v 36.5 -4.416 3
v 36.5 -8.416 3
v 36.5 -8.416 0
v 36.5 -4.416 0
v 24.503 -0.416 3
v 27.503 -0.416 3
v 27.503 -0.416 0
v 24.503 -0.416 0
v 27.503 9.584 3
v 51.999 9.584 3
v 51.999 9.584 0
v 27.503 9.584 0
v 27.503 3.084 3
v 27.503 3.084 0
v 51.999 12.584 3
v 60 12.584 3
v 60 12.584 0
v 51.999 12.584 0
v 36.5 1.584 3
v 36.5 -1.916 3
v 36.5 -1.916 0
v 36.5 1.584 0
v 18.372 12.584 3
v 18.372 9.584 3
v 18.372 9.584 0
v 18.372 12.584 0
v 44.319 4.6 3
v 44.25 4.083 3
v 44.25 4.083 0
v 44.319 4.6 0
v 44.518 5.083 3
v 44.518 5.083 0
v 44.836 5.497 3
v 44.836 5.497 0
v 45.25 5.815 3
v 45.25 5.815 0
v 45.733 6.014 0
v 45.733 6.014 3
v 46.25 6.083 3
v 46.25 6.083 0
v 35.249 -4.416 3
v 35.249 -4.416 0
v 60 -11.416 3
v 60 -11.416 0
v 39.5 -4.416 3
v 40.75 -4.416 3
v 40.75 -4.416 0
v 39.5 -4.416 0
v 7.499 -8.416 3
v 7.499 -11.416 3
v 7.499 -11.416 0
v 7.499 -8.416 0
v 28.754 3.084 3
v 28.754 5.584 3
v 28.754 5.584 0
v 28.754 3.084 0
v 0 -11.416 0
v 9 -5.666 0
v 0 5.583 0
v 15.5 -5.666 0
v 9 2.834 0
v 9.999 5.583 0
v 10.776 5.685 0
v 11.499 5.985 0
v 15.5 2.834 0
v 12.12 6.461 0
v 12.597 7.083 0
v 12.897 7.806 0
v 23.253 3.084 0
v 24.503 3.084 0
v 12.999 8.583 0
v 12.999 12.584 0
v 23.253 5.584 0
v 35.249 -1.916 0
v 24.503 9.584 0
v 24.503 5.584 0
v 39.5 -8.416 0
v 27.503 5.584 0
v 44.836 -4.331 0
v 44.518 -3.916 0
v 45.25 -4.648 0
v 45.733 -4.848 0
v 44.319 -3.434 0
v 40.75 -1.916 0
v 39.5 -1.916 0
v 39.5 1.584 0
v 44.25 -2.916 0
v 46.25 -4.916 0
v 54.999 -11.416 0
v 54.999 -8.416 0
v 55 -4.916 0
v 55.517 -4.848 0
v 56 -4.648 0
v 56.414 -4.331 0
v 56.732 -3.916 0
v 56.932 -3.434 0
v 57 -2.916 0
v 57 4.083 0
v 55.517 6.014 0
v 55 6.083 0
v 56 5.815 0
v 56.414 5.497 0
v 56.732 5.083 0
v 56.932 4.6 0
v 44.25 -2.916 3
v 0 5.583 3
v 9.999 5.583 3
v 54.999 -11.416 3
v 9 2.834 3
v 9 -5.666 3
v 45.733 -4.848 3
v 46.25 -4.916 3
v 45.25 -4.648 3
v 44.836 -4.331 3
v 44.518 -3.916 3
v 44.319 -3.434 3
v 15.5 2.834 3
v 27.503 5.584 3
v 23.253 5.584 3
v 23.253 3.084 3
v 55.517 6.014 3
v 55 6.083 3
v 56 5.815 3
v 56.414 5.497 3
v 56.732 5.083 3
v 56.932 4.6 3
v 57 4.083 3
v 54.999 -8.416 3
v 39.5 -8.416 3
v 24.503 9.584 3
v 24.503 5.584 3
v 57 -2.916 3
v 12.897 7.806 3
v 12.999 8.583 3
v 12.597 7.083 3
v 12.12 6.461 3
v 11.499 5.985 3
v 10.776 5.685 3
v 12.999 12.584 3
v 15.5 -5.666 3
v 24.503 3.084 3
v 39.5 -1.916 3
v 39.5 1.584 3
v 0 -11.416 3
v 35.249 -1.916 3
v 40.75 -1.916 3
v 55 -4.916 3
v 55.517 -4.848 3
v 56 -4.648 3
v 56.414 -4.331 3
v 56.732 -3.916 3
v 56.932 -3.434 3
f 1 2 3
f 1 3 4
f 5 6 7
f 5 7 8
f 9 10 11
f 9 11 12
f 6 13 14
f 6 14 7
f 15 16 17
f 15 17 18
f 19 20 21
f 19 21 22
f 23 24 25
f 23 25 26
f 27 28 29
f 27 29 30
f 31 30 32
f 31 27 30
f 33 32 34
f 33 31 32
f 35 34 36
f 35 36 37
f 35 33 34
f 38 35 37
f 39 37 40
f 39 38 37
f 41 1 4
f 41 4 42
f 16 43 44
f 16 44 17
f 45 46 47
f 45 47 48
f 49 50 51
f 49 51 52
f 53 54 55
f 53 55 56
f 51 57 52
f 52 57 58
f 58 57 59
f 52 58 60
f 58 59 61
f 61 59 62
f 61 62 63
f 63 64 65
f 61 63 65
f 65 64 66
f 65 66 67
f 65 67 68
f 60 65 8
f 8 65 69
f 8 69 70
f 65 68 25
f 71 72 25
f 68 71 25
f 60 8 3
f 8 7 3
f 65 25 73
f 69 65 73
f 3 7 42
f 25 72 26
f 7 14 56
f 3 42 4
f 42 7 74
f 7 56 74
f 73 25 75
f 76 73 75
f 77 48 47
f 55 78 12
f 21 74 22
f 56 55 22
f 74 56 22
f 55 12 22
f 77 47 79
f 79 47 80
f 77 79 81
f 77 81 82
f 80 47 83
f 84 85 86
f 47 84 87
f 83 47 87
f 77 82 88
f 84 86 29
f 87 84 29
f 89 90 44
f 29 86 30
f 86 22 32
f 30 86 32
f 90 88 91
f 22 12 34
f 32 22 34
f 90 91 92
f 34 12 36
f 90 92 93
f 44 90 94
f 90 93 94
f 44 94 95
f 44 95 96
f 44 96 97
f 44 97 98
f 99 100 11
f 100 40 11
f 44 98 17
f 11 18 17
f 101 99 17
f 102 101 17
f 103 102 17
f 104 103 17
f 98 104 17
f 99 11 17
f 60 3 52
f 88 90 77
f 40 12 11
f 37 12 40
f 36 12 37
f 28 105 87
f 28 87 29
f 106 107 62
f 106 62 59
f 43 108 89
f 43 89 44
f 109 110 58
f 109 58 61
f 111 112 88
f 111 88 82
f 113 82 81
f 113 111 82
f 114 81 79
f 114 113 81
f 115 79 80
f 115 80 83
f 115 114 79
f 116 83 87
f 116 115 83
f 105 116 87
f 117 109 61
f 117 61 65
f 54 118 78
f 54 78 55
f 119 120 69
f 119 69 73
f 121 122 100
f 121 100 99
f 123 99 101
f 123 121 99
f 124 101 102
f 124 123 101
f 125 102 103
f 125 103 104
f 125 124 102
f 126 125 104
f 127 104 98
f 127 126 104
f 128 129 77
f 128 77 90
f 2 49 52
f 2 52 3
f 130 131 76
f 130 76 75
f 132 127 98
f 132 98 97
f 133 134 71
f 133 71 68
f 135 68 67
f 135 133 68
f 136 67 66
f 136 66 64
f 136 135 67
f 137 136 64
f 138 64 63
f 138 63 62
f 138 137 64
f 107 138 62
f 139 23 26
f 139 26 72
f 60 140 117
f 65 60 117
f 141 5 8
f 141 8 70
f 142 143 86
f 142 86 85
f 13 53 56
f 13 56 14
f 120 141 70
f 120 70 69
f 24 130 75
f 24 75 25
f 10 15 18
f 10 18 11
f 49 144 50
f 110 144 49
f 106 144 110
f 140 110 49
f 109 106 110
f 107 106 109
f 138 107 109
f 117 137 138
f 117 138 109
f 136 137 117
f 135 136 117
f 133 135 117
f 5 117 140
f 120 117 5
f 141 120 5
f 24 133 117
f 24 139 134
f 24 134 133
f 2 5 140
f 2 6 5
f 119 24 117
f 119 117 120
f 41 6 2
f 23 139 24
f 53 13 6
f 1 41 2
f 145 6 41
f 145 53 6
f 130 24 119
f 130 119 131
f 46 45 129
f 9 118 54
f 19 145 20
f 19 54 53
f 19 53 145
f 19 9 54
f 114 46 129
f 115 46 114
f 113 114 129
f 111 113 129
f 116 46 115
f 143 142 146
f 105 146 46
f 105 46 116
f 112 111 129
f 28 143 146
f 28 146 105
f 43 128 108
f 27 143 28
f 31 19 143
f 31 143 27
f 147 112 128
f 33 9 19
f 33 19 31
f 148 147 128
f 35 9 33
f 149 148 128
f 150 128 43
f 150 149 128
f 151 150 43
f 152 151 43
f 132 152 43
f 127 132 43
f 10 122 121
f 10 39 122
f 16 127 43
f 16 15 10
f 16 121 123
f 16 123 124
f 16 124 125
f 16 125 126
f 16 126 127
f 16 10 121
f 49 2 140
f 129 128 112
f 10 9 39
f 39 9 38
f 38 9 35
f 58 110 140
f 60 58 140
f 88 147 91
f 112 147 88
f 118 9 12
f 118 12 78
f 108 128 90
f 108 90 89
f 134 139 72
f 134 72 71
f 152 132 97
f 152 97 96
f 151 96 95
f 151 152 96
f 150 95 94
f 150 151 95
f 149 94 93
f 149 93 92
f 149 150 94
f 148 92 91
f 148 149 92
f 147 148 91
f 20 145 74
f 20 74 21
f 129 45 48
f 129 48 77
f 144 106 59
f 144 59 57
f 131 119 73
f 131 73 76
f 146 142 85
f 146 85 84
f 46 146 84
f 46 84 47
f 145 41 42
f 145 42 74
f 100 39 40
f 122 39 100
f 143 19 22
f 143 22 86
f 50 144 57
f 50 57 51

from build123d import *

# Parameters (mm, degrees)
SKETCH_1_W      = 6.5
SKETCH_1_H      = 8.5
EXTRUDE_1_DEPTH = 3


with BuildPart() as part:
    # 草图1 → 凸台-拉伸1 (new body)
    with BuildSketch(Plane.XY.offset(3)):
        with BuildLine():
            Line((7.4994, -8.416368207), (36.5002, -8.416368207))
            Line((36.5002, -8.416368207), (36.5002, -4.416368207))
            Line((36.5002, -4.416368207), (35.2489, -4.416368207))
            Line((35.2489, -4.416368207), (35.2489, -1.916368207))
            Line((35.2489, -1.916368207), (36.5002, -1.916368207))
            Line((36.5002, -1.916368207), (36.5002, 1.583631793))
            Line((36.5002, 1.583631793), (39.5003, 1.583631793))
            Line((39.5003, 1.583631793), (39.5003, -1.916368207))
            Line((39.5003, -1.916368207), (40.7501, -1.916368207))
            Line((40.7501, -1.916368207), (40.7501, -4.416368207))
            Line((40.7501, -4.416368207), (39.5003, -4.416368207))
            Line((39.5003, -4.416368207), (39.5003, -8.416368207))
            Line((39.5003, -8.416368207), (54.9988, -8.416368207))
            Line((54.9988, -8.416368207), (54.9988, -11.416368207))
            Line((54.9988, -11.416368207), (59.9998, -11.416368207))
            Line((59.9998, -11.416368207), (59.9998, 12.583631793))
            Line((59.9998, 12.583631793), (51.9988, 12.583631793))
            Line((51.9988, 12.583631793), (51.9988, 9.583631793))
            Line((51.9988, 9.583631793), (27.5031, 9.583631793))
            Line((27.5031, 9.583631793), (27.5031, 5.583631793))
            Line((27.5031, 5.583631793), (28.7543, 5.583631793))
            Line((28.7543, 5.583631793), (28.7543, 3.083631793))
            Line((28.7543, 3.083631793), (27.5031, 3.083631793))
            Line((27.5031, 3.083631793), (27.5031, -0.416368207))
            Line((27.5031, -0.416368207), (24.503, -0.416368207))
            Line((24.503, -0.416368207), (24.503, 3.083631793))
            Line((24.503, 3.083631793), (23.2531, 3.083631793))
            Line((23.2531, 3.083631793), (23.2531, 5.583631793))
            Line((23.2531, 5.583631793), (24.503, 5.583631793))
            Line((24.503, 5.583631793), (24.503, 9.583631793))
            Line((24.503, 9.583631793), (18.3721, 9.583631793))
            Line((18.3721, 9.583631793), (18.3721, 12.583631793))
            Line((18.3721, 12.583631793), (12.9991, 12.583631793))
            Line((12.9991, 12.583631793), (12.9991, 8.582631793))
            ThreePointArc((12.9991, 8.582631793), (12.120420344, 6.461311449), (9.9991, 5.582631793))
            Line((9.9991, 5.582631793), (0, 5.582631793))
            Line((0, 5.582631793), (0, -11.416368207))
            Line((0, -11.416368207), (7.4994, -11.416368207))
            Line((7.4994, -11.416368207), (7.4994, -8.416368207))
        make_face()
        with Locations((12.25, -1.416368207)):
            Rectangle(SKETCH_1_W, SKETCH_1_H, mode=Mode.SUBTRACT)
        with BuildLine():
            Line((56.9998, 4.082631793), (56.9998, -2.916368207))
            ThreePointArc((56.9998, -2.916368207), (56.414013562, -4.330581769), (54.9998, -4.916368207))
            Line((54.9998, -4.916368207), (46.2504, -4.916368207))
            ThreePointArc((46.2504, -4.916368207), (44.836186438, -4.330581769), (44.2504, -2.916368207))
            Line((44.2504, -2.916368207), (44.2504, 4.082631793))
            ThreePointArc((44.2504, 4.082631793), (44.836186438, 5.496845355), (46.2504, 6.082631793))
            Line((46.2504, 6.082631793), (54.9998, 6.082631793))
            ThreePointArc((54.9998, 6.082631793), (56.414013562, 5.496845355), (56.9998, 4.082631793))
        make_face(mode=Mode.SUBTRACT)
    extrude(amount=-EXTRUDE_1_DEPTH)


solid = part.part
